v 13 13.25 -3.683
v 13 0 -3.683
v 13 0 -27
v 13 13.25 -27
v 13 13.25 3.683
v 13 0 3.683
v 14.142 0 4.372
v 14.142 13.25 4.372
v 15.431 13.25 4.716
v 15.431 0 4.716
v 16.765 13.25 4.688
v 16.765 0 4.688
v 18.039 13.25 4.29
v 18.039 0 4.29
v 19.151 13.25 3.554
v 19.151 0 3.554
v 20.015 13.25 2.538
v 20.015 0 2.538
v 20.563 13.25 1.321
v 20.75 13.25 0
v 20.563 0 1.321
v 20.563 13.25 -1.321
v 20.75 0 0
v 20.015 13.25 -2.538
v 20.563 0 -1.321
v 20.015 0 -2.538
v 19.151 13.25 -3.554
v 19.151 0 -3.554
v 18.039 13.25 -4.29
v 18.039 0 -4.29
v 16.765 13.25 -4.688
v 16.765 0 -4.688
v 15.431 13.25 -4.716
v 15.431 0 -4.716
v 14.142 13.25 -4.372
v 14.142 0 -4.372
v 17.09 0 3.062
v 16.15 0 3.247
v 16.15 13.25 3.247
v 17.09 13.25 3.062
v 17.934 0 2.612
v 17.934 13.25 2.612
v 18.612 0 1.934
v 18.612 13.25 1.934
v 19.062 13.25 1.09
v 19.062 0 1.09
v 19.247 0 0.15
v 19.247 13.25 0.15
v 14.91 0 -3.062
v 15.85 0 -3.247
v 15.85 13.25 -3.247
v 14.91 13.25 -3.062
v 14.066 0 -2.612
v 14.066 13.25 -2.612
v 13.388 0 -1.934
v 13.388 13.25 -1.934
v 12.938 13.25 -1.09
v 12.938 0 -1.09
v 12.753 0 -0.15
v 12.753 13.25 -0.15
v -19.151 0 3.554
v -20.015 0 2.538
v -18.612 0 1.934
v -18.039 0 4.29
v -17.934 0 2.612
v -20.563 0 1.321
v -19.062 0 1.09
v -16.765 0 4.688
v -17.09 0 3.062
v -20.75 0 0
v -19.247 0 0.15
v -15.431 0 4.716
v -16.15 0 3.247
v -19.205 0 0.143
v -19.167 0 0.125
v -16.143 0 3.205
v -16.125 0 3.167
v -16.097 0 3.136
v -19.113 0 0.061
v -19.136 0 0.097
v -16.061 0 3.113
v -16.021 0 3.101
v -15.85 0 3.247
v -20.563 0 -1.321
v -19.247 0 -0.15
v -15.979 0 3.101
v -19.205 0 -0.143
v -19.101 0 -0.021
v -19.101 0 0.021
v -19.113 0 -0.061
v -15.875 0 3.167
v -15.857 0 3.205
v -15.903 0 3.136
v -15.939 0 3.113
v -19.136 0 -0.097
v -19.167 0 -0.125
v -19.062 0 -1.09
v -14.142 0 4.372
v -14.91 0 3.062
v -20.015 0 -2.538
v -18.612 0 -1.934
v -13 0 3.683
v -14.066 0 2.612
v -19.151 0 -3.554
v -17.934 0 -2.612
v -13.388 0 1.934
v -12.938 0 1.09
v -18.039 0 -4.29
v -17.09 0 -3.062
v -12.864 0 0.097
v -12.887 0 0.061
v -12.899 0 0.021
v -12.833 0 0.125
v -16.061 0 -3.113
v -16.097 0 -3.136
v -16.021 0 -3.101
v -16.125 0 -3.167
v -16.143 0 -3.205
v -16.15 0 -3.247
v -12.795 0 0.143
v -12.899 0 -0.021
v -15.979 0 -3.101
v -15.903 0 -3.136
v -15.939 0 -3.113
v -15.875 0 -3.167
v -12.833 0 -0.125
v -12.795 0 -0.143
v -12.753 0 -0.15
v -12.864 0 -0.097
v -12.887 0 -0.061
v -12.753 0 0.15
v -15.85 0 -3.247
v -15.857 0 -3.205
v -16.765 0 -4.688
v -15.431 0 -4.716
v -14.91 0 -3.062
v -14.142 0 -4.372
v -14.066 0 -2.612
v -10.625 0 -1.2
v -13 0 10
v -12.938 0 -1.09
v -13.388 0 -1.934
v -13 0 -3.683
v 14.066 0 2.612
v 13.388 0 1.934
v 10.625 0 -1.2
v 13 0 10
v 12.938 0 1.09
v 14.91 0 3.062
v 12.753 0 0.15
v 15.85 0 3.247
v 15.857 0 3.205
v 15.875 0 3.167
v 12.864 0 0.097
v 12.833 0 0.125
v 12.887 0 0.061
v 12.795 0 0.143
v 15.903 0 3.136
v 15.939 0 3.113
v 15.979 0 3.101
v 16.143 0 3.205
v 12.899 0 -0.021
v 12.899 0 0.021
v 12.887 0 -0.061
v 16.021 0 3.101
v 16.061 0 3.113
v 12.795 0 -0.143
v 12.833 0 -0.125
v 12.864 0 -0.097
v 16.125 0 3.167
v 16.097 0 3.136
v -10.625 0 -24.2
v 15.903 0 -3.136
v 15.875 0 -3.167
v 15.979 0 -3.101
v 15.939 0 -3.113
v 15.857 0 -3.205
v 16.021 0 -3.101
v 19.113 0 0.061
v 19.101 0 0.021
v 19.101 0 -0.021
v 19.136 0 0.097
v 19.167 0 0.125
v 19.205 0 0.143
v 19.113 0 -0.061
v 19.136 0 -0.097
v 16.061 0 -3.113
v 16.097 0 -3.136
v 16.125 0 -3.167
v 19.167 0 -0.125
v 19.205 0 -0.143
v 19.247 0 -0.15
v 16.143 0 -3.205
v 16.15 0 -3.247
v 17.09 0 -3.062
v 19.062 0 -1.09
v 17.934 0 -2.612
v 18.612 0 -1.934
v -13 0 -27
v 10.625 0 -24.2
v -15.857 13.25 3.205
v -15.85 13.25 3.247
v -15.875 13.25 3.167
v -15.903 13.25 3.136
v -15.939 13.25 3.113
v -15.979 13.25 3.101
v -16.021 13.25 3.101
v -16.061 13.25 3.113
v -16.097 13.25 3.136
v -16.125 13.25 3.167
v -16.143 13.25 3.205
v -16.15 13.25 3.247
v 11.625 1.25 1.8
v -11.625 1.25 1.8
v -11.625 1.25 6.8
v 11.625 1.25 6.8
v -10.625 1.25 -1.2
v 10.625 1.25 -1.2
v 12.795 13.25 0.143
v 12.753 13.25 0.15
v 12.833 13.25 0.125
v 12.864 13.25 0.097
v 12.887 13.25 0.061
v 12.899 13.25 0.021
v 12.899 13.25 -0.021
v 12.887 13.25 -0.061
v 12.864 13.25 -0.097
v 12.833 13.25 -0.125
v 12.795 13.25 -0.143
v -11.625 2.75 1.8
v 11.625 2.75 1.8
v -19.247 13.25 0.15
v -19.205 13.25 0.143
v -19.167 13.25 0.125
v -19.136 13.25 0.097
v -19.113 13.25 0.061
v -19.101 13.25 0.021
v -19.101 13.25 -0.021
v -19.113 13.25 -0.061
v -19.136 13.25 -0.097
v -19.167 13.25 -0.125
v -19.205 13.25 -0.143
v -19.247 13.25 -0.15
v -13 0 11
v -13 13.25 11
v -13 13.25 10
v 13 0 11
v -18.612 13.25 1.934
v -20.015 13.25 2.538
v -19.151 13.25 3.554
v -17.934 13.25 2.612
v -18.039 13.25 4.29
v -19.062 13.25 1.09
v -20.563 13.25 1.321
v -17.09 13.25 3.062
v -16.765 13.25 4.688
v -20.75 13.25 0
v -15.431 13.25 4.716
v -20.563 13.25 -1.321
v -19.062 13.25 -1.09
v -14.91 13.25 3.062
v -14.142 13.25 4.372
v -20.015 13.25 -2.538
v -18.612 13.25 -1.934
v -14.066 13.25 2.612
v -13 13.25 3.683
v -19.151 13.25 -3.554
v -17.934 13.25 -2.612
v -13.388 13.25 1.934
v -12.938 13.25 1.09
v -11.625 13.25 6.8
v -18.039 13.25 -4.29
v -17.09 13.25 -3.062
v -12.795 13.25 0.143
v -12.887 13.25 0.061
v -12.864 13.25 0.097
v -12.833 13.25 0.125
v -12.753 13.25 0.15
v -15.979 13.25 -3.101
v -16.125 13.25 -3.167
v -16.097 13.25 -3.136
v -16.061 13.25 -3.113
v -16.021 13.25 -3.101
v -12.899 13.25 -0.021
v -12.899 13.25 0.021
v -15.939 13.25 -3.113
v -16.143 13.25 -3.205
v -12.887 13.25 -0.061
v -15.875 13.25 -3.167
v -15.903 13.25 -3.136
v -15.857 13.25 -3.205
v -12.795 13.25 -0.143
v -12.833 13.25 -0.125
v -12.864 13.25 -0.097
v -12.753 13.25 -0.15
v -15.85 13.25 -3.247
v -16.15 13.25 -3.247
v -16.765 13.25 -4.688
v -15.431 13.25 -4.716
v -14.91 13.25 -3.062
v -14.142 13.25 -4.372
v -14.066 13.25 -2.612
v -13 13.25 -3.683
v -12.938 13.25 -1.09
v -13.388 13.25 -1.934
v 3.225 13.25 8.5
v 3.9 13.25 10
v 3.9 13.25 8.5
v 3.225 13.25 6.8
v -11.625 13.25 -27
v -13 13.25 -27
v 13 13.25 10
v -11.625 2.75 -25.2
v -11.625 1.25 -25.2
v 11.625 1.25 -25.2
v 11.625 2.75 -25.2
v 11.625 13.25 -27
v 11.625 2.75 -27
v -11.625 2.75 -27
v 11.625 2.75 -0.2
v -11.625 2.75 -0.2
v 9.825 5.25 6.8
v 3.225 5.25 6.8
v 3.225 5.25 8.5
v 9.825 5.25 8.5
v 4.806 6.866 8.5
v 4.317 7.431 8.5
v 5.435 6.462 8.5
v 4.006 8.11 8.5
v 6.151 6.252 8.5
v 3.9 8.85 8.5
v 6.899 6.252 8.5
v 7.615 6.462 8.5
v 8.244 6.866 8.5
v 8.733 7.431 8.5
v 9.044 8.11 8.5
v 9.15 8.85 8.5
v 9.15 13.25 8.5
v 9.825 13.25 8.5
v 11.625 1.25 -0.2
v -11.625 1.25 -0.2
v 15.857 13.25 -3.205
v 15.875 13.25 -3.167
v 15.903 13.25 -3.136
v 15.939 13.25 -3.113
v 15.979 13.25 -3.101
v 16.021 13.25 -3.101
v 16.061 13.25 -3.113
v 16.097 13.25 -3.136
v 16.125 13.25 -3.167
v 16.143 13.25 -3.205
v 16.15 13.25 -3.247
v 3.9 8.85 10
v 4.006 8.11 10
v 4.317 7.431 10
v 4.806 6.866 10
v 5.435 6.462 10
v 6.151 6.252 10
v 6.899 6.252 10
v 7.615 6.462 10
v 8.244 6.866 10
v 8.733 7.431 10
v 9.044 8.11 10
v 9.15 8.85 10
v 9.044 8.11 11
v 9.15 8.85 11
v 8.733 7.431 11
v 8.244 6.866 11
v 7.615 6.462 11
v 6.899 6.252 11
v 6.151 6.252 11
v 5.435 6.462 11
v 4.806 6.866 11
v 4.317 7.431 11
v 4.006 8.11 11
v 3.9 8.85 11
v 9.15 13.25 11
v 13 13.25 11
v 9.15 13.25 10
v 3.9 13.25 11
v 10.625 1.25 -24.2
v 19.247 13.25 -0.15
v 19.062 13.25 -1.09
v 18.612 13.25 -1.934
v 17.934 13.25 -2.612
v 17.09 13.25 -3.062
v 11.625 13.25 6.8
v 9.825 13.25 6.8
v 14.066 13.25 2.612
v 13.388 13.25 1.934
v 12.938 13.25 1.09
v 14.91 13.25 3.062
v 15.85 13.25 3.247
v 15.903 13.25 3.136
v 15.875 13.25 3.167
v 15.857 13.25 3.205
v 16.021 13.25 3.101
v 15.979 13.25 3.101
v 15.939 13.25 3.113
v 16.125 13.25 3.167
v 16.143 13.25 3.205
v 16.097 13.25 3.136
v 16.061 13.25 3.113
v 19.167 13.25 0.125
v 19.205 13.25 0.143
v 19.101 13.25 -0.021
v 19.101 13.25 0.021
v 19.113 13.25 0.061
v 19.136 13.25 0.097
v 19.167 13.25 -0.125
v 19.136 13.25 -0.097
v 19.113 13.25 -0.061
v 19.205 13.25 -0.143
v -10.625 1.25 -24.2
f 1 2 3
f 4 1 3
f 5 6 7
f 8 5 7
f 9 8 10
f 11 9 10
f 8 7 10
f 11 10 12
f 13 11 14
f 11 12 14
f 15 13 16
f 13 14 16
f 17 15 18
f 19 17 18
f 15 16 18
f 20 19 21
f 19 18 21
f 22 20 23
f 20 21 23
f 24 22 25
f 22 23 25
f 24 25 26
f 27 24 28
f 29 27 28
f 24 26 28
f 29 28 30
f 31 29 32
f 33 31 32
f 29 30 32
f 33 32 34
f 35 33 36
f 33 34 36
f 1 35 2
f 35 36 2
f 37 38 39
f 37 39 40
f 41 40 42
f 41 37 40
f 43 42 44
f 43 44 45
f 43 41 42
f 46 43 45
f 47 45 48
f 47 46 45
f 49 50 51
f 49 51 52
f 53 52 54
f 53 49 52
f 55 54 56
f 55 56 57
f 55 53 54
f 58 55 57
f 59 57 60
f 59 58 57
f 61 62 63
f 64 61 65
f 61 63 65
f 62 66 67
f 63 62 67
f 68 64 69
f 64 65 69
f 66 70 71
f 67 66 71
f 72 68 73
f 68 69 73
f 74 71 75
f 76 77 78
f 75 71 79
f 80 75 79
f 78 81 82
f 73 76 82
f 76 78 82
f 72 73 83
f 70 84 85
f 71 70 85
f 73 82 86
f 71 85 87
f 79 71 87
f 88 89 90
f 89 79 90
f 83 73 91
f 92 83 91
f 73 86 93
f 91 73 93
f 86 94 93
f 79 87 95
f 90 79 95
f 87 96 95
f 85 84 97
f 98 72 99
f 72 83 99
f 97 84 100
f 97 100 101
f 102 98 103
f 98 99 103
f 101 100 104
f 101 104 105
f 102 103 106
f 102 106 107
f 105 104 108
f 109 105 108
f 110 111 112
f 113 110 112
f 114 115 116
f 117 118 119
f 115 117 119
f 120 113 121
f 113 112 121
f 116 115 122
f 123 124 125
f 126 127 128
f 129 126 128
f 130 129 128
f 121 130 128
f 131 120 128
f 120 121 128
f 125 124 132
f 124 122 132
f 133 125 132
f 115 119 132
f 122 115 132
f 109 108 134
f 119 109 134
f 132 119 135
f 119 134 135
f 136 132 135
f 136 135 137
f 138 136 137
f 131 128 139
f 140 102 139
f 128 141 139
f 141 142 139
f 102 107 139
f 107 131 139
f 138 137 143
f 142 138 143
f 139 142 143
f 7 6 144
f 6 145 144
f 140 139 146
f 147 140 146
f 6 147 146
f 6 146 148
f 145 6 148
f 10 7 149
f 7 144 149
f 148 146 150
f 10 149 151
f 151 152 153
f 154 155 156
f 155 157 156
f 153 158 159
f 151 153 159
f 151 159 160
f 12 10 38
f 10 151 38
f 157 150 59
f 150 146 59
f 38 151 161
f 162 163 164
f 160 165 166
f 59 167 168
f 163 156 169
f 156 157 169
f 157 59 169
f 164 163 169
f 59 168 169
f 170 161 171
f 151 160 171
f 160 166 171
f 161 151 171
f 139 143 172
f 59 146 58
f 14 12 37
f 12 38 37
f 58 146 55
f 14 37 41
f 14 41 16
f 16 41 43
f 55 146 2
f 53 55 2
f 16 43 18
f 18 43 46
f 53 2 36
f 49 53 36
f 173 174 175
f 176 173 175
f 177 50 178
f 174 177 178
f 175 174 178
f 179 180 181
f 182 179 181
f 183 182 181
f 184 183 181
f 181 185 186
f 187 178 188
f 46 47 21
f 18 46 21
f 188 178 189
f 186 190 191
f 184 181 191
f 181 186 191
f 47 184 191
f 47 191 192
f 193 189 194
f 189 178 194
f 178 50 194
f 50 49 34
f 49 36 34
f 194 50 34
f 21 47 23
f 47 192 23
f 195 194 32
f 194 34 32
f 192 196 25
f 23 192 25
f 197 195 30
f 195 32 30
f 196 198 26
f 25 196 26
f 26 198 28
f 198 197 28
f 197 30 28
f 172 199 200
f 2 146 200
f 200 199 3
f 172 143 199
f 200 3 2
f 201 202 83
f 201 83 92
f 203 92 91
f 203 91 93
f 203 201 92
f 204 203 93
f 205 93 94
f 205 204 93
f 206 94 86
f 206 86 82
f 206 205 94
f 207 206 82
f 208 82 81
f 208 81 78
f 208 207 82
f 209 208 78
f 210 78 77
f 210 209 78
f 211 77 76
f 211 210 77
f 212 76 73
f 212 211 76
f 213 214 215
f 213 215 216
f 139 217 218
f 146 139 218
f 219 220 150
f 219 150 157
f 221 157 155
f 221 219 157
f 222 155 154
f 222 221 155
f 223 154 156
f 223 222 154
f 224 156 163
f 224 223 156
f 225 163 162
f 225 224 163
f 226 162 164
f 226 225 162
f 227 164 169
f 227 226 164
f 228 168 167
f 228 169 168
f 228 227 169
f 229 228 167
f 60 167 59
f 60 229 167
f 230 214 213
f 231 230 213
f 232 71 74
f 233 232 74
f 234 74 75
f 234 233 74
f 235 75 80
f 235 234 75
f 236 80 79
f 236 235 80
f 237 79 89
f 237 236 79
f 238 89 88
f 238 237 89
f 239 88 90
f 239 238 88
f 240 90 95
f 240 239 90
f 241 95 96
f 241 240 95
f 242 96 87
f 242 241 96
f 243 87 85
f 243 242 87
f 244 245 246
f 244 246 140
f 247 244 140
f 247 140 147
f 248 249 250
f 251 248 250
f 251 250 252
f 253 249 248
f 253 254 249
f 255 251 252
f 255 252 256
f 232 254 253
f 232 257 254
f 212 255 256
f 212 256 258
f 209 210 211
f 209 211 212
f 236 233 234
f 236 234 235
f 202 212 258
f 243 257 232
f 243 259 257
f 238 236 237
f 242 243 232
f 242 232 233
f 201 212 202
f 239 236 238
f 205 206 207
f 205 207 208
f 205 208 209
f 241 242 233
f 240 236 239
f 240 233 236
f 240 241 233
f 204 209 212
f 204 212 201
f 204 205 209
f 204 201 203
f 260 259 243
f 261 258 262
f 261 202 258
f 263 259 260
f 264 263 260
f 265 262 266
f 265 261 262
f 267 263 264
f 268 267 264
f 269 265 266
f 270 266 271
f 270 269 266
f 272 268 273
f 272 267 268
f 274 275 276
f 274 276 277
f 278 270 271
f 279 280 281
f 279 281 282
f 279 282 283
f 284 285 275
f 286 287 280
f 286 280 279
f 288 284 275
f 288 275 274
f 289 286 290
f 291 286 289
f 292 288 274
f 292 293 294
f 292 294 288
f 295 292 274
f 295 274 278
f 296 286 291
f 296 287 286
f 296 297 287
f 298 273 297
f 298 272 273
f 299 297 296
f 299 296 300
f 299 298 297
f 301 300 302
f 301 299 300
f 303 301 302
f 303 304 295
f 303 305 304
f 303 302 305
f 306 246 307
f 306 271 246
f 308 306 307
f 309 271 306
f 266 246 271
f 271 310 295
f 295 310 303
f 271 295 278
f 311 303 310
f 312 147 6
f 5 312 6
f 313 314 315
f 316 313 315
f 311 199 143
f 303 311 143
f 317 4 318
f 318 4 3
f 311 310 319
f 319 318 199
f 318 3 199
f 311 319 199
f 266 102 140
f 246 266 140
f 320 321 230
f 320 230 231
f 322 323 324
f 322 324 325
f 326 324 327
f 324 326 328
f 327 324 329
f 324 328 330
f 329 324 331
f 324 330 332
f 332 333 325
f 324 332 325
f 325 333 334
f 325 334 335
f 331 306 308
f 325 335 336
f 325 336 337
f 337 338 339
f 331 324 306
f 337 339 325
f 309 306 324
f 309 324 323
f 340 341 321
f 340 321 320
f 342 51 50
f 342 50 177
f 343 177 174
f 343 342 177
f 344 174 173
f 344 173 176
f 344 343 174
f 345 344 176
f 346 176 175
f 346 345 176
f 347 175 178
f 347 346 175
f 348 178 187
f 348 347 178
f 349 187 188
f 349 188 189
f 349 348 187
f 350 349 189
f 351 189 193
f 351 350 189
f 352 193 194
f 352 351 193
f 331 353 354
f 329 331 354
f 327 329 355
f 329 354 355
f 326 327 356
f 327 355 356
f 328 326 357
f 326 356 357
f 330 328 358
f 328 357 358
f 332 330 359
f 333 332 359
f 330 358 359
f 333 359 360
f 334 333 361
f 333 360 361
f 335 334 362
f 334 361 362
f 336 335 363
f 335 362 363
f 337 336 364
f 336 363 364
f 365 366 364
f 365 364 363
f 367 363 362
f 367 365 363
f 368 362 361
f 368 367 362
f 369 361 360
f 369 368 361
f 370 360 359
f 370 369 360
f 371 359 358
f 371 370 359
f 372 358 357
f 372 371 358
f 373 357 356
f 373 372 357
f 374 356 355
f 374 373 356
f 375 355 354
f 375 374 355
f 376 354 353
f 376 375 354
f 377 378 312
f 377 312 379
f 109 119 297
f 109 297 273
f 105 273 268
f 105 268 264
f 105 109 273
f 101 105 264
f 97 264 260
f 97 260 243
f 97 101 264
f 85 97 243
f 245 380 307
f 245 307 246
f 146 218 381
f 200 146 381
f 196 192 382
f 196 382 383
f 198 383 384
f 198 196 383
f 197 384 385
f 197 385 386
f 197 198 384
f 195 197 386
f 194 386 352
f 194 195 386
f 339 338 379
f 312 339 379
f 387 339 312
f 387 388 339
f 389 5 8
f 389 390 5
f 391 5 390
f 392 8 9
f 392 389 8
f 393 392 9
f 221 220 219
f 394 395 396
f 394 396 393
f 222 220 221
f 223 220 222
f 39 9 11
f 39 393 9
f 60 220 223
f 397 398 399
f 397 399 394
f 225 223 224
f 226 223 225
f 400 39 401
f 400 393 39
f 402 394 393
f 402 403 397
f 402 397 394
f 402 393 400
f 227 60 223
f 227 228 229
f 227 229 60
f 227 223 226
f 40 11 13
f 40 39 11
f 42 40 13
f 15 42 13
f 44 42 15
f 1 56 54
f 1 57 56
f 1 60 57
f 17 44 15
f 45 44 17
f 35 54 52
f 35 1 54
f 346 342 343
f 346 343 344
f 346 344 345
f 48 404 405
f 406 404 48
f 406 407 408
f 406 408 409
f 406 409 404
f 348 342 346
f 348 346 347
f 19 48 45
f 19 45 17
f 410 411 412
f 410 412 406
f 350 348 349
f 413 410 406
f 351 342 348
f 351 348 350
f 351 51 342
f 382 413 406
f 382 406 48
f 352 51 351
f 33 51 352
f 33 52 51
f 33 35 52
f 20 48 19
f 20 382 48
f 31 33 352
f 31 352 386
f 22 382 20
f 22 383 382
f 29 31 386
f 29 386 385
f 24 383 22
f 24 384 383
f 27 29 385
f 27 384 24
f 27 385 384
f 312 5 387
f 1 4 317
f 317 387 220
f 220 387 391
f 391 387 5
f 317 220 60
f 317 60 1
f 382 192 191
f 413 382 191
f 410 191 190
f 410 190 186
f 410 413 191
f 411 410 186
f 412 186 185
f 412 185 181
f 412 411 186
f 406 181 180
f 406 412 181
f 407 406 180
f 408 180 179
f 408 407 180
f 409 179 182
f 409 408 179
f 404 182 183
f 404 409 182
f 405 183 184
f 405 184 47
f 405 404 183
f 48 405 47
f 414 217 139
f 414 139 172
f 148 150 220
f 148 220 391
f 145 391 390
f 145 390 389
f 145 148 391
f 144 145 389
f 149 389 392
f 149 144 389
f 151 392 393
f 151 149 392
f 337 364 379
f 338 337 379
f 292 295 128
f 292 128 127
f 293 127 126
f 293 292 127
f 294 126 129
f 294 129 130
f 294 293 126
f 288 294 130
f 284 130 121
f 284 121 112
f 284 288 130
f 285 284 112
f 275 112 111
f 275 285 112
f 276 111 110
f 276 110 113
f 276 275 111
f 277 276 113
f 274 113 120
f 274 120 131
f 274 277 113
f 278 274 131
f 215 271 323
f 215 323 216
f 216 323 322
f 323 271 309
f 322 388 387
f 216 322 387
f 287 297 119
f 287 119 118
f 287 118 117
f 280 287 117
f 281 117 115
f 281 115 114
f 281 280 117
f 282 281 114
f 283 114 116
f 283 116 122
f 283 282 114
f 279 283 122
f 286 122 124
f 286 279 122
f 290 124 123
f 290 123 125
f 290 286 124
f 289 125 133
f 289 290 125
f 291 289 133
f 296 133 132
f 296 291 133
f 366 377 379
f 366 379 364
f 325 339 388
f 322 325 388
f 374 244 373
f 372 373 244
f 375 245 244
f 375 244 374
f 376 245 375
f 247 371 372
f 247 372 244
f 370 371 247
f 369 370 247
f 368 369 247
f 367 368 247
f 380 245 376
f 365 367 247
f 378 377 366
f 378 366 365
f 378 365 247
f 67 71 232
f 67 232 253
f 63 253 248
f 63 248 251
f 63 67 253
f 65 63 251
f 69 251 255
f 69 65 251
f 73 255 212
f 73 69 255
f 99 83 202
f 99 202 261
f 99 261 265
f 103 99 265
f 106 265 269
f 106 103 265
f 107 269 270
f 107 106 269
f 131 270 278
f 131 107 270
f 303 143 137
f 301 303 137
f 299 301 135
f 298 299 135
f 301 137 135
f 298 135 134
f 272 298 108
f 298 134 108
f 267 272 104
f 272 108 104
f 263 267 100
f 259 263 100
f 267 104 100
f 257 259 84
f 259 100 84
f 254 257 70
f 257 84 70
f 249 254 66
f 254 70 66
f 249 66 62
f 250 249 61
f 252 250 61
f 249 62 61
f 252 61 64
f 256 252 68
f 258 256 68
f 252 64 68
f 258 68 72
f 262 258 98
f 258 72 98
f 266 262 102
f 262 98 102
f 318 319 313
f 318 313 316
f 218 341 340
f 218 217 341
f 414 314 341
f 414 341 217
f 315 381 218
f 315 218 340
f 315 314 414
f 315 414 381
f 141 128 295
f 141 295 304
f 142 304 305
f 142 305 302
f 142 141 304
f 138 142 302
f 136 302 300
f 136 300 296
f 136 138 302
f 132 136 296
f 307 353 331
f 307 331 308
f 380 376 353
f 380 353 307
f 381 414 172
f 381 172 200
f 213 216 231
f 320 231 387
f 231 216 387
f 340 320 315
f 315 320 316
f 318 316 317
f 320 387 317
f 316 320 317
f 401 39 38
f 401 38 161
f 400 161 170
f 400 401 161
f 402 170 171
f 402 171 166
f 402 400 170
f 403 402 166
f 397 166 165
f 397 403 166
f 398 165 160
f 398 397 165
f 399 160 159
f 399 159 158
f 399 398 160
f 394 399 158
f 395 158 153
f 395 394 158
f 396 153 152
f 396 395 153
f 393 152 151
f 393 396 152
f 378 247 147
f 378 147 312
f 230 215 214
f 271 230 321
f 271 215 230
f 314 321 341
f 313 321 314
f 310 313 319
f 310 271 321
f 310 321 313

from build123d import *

# Parameters (mm, degrees)
SKETCH1_R           = 3.25
BOSS_EXTRUDE1_DEPTH = 13.25
SKETCH2_W           = 23.25
SKETCH2_H           = 33.8
CUT_EXTRUDE1_DEPTH  = 12
CUT_EXTRUDE2_REACH  = 46.442
SKETCH3_R           = 2.625
SKETCH4_W           = 6.6
SKETCH4_H           = 1.7
CUT_EXTRUDE3_DEPTH  = 8
SKETCH5_W           = 23.25
SKETCH5_H           = 2
SKETCH5_H_2         = 1.8
BOSS_EXTRUDE2_DEPTH = 1.5
CUT_EXTRUDE4_REACH  = 38.105
SKETCH6_W           = 21.25
SKETCH6_H           = 23
SKETCH7_R           = 0.15
BOSS_EXTRUDE3_DEPTH = 13.25
BOSS_EXTRUDE4_START = 1
BOSS_EXTRUDE4_DEPTH = 1


with BuildPart() as part:
    # Sketch1 → Boss-Extrude1 (new body)
    with BuildSketch(Plane(origin=(0, 0, 0), x_dir=(1, 0, 0), z_dir=(0, 1, 0))):
        with BuildLine():
            Line((13, 27), (-13, 27))
            Line((-13, 27), (-13, 3.682729966))
            ThreePointArc((-13, 3.682729966), (-20.75, 0), (-13, -3.682729966))
            Line((-13, -3.682729966), (-13, -10))
            Line((-13, -10), (13, -10))
            Line((13, -10), (13, -3.682729966))
            ThreePointArc((13, -3.682729966), (20.75, 0), (13, 3.682729966))
            Line((13, 3.682729966), (13, 27))
        make_face()
        with Locations(Location((-16, 0, 0), (0, 0, 270))):
            Circle(SKETCH1_R, mode=Mode.SUBTRACT)
        with Locations(Location((16, 0, 0), (0, 0, 270))):
            Circle(SKETCH1_R, mode=Mode.SUBTRACT)
    extrude(amount=BOSS_EXTRUDE1_DEPTH)

    # Sketch2 → Cut-Extrude1 (cut)
    with BuildSketch(Plane(origin=(0, 13.25, 0), x_dir=(1, 0, 0), z_dir=(0, 1, 0))):
        with Locations((0, 10.1)):
            Rectangle(SKETCH2_W, SKETCH2_H)
    extrude(amount=-CUT_EXTRUDE1_DEPTH, mode=Mode.SUBTRACT)

    # Sketch3 → Cut-Extrude2 (cut, up to next)
    with BuildSketch(Plane.XY.offset(10), mode=Mode.PRIVATE) as cut_extrude2_sk1:
        with BuildLine():
            Line((3.9, 13.25), (3.9, 8.85))
            ThreePointArc((3.9, 8.85), (6.525, 11.475), (9.15, 8.85))
            Line((9.15, 8.85), (9.15, 13.25))
            Line((9.15, 13.25), (3.9, 13.25))
        make_face()
    cut_extrude2_tool1 = extrude(cut_extrude2_sk1.sketch, amount=-CUT_EXTRUDE2_REACH, mode=Mode.PRIVATE) & part.part
    # Sketch3 → Cut-Extrude2 (cut, up to next)
    with BuildSketch(Plane.XY.offset(10), mode=Mode.PRIVATE) as cut_extrude2_sk2:
        with Locations((6.525, 8.85)):
            Circle(SKETCH3_R)
    cut_extrude2_tool2 = extrude(cut_extrude2_sk2.sketch, amount=-CUT_EXTRUDE2_REACH, mode=Mode.PRIVATE) & part.part
    add(cut_extrude2_tool1.solids().sort_by_distance((6.525, 12.007435, 10))[0], mode=Mode.SUBTRACT)
    add(cut_extrude2_tool2.solids().sort_by_distance((6.525, 8.85, 10))[0], mode=Mode.SUBTRACT)

    # Sketch4 → Cut-Extrude3 (cut)
    with BuildSketch(Plane(origin=(0, 13.25, 0), x_dir=(1, 0, 0), z_dir=(0, 1, 0))):
        with Locations((6.525, -7.65)):
            Rectangle(SKETCH4_W, SKETCH4_H)
    extrude(amount=-CUT_EXTRUDE3_DEPTH, mode=Mode.SUBTRACT)

    # Sketch5 → Boss-Extrude2 (add)
    with BuildSketch(Plane(origin=(0, 1.25, 0), x_dir=(1, 0, 0), z_dir=(0, 1, 0))):
        with Locations((0, -0.8)):
            Rectangle(SKETCH5_W, SKETCH5_H)
        with Locations((0, 26.1)):
            Rectangle(SKETCH5_W, SKETCH5_H_2)
    extrude(amount=BOSS_EXTRUDE2_DEPTH)

    # Sketch6 → Cut-Extrude4 (cut, up to next)
    with BuildSketch(Plane(origin=(0, 1.25, 0), x_dir=(1, 0, 0), z_dir=(0, 1, 0)), mode=Mode.PRIVATE) as cut_extrude4_sk1:
        with Locations((0, 12.7)):
            Rectangle(SKETCH6_W, SKETCH6_H)
    cut_extrude4_tool1 = extrude(cut_extrude4_sk1.sketch, amount=-CUT_EXTRUDE4_REACH, mode=Mode.PRIVATE) & part.part
    add(cut_extrude4_tool1.solids().sort_by_distance((0, 1.25, -12.7))[0], mode=Mode.SUBTRACT)

    # Sketch7 → Boss-Extrude3 (add)
    with BuildSketch(Plane(origin=(0, 13.25, 0), x_dir=(1, 0, 0), z_dir=(0, 1, 0))):
        with Locations((-16, 3.25)):
            Circle(SKETCH7_R)
        with Locations((-19.25, 0)):
            Circle(SKETCH7_R)
        with Locations((-12.75, 0)):
            Circle(SKETCH7_R)
        with Locations((-16, -3.25)):
            Circle(SKETCH7_R)
        with Locations((16, -3.25)):
            Circle(SKETCH7_R)
        with Locations((12.75, 0)):
            Circle(SKETCH7_R)
        with Locations((19.25, 0)):
            Circle(SKETCH7_R)
        with Locations((16, 3.25)):
            Circle(SKETCH7_R)
    extrude(amount=-BOSS_EXTRUDE3_DEPTH)

    # Sketch8 → Boss-Extrude4 (add)
    with BuildSketch(Plane.XY.offset(10).offset(BOSS_EXTRUDE4_START)):
        with BuildLine():
            Line((3.9, 8.85), (3.9, 13.25))
            Line((3.9, 13.25), (-13, 13.25))
            Line((-13, 13.25), (-13, 0))
            Line((-13, 0), (13, 0))
            Line((13, 0), (13, 13.25))
            Line((13, 13.25), (9.15, 13.25))
            Line((9.15, 13.25), (9.15, 8.85))
            ThreePointArc((9.15, 8.85), (6.525, 6.225), (3.9, 8.85))
        make_face()
    extrude(amount=-BOSS_EXTRUDE4_DEPTH)


solid = part.part
